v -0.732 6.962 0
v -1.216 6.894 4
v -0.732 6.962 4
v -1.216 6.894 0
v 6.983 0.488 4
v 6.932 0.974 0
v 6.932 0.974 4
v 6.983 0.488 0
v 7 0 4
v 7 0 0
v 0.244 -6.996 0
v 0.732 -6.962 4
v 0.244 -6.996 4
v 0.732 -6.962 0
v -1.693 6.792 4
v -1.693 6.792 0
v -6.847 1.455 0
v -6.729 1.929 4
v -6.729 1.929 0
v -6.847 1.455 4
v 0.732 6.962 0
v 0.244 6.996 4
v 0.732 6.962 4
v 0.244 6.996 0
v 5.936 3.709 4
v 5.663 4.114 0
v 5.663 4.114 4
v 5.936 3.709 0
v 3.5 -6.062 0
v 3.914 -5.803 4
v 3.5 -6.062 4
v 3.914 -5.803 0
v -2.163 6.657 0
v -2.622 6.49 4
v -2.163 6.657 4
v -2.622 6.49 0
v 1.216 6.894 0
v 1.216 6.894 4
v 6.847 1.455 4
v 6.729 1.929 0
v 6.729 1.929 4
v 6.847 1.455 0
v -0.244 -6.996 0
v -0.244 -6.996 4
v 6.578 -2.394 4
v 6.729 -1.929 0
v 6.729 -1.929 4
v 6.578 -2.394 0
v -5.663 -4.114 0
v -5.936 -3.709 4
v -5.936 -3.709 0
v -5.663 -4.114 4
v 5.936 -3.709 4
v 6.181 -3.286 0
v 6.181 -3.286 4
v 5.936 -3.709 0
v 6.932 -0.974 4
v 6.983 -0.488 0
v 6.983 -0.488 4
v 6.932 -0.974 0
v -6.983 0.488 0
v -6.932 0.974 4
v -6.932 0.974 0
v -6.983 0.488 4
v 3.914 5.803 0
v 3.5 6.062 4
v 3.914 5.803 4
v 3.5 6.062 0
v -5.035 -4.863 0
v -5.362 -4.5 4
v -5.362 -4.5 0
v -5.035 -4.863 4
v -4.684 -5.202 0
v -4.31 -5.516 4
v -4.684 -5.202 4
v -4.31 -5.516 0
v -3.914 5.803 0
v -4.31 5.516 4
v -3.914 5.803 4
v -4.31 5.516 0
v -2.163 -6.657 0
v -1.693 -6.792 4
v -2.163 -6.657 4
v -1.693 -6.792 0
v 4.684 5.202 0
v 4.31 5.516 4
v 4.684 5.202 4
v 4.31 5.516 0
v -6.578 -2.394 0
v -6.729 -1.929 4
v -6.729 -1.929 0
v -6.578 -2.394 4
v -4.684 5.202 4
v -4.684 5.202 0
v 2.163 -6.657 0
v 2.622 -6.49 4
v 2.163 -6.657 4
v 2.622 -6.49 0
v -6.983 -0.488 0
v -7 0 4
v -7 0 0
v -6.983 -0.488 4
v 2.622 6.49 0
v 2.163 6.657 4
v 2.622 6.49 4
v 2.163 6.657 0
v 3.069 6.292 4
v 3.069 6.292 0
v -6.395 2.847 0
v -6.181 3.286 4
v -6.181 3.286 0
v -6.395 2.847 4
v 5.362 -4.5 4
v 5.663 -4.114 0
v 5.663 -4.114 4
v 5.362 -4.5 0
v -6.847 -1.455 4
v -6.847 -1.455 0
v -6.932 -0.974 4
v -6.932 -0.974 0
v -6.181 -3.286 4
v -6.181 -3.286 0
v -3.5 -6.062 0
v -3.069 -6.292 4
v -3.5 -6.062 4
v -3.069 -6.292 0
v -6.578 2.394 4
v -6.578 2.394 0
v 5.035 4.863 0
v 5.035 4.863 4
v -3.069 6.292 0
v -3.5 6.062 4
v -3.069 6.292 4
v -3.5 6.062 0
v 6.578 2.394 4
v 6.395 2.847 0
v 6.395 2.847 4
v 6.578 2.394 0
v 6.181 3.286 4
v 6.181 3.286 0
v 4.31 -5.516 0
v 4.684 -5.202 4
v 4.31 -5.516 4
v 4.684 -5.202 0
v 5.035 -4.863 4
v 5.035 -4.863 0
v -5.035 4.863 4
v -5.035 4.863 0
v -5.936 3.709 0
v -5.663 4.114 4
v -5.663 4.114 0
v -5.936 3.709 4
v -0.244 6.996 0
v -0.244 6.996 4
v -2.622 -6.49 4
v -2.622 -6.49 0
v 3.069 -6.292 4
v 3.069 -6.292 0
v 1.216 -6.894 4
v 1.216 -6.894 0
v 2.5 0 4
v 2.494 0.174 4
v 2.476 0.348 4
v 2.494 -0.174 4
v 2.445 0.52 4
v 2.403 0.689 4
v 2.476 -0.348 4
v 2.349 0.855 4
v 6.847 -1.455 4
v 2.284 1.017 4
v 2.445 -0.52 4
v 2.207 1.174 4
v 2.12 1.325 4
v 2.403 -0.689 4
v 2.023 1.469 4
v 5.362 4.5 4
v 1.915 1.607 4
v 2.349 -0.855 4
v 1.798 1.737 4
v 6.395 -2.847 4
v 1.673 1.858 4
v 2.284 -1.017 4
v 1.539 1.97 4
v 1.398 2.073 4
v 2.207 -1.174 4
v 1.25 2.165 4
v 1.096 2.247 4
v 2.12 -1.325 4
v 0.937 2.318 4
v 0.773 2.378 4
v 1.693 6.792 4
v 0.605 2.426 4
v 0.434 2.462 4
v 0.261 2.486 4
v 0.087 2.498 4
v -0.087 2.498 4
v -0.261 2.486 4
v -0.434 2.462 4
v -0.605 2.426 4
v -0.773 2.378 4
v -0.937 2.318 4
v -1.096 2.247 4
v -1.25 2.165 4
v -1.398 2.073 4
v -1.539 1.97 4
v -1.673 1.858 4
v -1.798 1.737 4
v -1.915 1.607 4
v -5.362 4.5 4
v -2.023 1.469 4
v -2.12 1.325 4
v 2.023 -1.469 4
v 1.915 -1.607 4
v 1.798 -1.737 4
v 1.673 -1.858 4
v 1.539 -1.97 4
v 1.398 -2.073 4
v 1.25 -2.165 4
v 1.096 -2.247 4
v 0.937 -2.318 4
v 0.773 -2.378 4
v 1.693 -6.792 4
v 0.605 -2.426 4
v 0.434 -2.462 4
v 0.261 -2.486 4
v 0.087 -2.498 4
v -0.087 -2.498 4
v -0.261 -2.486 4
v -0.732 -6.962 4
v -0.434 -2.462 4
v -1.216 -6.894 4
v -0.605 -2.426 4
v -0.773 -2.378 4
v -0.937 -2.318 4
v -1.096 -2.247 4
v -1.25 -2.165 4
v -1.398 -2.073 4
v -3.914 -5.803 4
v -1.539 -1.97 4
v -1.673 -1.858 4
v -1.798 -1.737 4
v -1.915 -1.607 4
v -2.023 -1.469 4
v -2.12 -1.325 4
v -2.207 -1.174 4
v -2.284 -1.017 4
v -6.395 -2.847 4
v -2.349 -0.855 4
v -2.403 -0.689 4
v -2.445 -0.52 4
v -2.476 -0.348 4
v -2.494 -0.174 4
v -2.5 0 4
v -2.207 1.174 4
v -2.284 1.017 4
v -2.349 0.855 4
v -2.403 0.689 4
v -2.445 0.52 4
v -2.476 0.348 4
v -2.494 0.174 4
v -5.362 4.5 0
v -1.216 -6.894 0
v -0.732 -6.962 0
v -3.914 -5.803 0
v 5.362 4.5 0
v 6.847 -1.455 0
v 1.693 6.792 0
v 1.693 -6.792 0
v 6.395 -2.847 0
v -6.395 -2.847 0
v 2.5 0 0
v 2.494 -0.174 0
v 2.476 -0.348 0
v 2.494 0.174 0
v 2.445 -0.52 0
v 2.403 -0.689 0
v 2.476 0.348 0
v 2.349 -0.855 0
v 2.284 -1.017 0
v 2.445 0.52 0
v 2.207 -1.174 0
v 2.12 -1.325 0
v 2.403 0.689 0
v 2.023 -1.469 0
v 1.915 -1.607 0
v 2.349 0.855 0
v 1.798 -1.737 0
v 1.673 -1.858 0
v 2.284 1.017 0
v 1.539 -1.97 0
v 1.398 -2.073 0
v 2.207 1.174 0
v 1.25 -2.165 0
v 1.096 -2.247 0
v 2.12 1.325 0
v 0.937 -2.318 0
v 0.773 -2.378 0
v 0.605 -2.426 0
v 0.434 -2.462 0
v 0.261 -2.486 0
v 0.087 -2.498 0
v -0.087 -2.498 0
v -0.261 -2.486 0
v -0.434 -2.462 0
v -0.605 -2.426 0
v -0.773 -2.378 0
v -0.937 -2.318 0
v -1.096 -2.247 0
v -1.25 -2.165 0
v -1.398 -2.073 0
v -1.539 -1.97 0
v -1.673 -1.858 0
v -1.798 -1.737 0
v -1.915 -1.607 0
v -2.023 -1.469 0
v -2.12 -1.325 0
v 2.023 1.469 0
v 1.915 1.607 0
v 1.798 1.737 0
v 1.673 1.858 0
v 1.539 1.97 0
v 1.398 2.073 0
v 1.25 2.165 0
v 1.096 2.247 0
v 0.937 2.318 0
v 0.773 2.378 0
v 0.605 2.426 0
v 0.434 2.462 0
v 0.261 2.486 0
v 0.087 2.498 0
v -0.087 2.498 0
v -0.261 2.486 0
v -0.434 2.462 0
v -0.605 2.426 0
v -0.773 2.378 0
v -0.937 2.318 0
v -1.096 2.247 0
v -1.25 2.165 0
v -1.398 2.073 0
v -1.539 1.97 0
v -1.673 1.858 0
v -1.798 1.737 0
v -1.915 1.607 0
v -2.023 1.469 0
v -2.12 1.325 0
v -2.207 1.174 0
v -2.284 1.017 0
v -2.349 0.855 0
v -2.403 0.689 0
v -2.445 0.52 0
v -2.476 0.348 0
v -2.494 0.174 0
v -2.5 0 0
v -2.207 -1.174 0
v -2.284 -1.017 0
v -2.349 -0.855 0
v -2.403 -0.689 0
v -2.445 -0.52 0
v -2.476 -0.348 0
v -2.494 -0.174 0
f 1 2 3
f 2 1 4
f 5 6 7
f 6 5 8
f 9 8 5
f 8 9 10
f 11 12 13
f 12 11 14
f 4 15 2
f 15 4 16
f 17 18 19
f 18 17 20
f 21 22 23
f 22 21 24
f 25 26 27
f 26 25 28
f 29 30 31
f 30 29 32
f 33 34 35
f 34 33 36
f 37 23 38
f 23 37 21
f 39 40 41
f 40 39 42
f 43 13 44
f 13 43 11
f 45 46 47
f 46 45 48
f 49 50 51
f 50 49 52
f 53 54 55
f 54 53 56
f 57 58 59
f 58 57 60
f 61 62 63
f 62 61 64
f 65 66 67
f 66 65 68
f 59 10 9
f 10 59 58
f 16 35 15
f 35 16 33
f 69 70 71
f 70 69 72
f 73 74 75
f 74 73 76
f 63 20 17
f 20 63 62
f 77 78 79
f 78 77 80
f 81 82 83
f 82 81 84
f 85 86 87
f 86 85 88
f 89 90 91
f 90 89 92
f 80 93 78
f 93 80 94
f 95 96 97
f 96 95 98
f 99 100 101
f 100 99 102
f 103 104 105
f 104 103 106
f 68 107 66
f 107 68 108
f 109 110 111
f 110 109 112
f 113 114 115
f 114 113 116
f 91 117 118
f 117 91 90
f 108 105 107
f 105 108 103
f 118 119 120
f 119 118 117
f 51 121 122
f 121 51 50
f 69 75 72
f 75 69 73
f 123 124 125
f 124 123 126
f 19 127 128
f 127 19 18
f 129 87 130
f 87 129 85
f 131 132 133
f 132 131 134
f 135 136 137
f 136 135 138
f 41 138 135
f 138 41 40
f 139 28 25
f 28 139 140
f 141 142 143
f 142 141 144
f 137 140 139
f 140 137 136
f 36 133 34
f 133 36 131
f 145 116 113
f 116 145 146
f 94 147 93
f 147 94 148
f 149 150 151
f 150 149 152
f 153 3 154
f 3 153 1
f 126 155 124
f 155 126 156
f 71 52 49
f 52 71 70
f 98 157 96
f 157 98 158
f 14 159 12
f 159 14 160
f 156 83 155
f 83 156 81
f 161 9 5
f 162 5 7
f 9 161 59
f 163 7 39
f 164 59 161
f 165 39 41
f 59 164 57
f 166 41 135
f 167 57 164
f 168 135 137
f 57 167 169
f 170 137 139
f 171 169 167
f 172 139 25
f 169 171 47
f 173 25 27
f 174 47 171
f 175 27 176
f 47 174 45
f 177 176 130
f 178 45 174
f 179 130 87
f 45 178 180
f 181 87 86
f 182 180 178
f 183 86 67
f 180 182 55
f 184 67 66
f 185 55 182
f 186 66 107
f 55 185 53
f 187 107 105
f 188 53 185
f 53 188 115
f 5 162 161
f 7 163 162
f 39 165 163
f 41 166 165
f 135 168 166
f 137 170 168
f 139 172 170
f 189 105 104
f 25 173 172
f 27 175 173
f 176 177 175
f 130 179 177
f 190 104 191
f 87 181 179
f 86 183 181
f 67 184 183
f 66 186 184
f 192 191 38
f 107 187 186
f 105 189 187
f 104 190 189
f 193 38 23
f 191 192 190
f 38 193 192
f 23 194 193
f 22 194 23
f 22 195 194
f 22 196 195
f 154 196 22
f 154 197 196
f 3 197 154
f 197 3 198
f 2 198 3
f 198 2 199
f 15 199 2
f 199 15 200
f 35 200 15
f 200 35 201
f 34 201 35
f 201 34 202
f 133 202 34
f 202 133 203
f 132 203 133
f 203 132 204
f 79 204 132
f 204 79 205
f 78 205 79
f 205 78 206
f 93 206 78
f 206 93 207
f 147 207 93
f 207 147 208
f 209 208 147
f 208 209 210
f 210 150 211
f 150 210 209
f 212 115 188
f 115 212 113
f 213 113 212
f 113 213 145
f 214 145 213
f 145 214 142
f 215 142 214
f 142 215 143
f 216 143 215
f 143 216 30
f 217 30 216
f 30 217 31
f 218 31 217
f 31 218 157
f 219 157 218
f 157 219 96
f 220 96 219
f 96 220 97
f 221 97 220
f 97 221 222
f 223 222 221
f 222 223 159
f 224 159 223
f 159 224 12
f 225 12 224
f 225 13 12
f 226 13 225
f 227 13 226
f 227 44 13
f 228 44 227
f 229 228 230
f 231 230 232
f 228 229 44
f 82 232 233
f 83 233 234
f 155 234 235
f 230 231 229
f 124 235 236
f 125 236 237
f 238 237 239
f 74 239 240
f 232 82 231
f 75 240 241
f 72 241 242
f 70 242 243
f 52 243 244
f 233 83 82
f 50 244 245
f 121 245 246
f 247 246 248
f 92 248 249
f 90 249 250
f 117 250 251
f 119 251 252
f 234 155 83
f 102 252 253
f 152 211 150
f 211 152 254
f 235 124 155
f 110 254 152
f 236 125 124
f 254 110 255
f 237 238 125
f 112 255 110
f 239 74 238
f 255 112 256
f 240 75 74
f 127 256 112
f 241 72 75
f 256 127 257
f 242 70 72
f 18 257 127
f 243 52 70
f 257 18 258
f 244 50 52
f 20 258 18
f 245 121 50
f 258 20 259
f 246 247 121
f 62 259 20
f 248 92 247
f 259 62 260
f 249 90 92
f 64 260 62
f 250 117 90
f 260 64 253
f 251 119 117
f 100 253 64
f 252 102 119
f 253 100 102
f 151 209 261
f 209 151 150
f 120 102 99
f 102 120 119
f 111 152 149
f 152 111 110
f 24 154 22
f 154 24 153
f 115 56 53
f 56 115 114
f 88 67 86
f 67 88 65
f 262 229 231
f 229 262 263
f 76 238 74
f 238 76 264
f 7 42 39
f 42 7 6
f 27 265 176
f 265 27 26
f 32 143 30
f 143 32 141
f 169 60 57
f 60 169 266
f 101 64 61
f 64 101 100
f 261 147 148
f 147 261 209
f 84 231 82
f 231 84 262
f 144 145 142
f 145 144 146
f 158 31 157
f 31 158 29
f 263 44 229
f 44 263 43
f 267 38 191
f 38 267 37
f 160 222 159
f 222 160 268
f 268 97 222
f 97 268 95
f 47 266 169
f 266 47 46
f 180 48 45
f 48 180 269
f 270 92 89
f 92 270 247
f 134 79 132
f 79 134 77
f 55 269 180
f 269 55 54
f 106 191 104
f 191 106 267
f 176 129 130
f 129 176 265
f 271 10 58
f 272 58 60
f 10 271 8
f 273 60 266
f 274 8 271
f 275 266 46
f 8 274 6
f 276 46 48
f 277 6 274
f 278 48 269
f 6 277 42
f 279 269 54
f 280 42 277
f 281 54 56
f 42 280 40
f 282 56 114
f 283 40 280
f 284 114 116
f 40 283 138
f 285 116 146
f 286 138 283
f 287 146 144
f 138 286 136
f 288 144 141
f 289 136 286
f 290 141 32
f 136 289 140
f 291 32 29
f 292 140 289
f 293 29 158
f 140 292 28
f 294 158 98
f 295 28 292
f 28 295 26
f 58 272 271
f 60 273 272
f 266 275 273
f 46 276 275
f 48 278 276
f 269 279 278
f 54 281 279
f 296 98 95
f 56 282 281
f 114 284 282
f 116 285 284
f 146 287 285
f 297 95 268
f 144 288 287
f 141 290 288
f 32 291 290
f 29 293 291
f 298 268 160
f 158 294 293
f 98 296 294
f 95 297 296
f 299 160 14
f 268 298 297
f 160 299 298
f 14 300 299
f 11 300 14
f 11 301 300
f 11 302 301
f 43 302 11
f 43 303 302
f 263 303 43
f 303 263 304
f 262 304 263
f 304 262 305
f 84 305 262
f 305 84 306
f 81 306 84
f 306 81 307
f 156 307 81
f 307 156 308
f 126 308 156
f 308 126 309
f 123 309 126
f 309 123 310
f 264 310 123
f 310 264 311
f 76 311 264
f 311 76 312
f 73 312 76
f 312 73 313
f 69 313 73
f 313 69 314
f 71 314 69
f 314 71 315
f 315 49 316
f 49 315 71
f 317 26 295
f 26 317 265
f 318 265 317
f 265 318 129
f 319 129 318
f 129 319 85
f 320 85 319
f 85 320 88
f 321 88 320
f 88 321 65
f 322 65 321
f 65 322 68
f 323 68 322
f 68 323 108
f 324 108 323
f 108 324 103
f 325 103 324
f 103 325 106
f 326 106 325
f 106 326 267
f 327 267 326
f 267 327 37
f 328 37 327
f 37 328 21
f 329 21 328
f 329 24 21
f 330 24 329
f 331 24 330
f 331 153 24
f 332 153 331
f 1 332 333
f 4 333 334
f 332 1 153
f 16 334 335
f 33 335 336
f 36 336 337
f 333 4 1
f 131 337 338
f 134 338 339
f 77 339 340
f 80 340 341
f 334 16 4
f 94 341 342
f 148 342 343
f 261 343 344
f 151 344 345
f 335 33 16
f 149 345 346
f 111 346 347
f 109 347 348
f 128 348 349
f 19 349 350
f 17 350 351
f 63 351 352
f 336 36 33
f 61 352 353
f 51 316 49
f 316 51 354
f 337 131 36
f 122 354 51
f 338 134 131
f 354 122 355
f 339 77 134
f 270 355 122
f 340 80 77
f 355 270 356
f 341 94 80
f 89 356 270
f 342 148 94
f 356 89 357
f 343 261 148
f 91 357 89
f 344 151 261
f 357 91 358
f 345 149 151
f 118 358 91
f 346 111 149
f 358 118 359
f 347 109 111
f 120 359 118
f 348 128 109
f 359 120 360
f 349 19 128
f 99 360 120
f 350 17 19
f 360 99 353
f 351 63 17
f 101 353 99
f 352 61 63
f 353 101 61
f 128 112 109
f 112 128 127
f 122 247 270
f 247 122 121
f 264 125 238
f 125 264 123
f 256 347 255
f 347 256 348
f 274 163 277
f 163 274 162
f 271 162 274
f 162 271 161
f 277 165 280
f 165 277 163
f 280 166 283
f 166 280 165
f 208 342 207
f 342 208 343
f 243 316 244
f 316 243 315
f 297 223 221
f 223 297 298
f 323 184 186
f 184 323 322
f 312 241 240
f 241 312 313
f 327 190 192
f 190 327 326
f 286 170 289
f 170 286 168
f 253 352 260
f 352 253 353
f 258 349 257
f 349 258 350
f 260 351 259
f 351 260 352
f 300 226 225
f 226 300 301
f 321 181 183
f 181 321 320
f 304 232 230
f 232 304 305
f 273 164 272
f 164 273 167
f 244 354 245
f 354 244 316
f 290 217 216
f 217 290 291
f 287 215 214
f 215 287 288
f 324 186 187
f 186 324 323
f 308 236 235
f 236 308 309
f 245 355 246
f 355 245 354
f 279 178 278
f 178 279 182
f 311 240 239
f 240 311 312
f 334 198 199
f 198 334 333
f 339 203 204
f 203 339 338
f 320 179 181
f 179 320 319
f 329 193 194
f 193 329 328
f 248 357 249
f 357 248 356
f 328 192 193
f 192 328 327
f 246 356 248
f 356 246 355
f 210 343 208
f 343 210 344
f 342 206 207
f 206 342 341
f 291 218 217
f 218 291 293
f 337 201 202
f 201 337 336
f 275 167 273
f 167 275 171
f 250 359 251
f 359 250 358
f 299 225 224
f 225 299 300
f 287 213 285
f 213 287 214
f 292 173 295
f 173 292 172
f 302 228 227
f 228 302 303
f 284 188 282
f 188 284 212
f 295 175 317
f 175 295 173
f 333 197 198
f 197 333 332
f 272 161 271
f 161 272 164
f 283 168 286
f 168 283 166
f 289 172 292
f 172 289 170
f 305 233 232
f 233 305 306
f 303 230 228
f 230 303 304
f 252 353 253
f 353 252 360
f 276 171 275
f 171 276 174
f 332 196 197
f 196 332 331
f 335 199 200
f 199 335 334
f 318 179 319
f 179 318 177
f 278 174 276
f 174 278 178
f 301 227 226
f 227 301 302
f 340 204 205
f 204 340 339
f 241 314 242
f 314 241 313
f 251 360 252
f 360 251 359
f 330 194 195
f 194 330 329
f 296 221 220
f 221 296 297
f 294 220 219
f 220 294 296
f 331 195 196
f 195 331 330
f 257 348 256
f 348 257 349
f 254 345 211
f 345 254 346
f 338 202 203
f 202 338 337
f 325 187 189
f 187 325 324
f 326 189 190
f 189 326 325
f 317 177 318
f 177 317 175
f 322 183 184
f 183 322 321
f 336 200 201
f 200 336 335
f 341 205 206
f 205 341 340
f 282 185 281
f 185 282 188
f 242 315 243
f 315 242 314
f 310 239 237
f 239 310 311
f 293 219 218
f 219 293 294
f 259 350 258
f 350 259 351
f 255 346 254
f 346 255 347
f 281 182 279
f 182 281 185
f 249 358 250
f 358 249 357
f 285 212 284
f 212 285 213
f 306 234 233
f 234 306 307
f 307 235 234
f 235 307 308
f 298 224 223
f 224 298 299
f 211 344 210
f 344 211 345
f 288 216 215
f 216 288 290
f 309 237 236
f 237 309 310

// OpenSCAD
$fn = 90;

difference() {
    cylinder(d = 14, h = 4);
    translate([0, 0, -3]) cylinder(d = 5, h = 10);
}
